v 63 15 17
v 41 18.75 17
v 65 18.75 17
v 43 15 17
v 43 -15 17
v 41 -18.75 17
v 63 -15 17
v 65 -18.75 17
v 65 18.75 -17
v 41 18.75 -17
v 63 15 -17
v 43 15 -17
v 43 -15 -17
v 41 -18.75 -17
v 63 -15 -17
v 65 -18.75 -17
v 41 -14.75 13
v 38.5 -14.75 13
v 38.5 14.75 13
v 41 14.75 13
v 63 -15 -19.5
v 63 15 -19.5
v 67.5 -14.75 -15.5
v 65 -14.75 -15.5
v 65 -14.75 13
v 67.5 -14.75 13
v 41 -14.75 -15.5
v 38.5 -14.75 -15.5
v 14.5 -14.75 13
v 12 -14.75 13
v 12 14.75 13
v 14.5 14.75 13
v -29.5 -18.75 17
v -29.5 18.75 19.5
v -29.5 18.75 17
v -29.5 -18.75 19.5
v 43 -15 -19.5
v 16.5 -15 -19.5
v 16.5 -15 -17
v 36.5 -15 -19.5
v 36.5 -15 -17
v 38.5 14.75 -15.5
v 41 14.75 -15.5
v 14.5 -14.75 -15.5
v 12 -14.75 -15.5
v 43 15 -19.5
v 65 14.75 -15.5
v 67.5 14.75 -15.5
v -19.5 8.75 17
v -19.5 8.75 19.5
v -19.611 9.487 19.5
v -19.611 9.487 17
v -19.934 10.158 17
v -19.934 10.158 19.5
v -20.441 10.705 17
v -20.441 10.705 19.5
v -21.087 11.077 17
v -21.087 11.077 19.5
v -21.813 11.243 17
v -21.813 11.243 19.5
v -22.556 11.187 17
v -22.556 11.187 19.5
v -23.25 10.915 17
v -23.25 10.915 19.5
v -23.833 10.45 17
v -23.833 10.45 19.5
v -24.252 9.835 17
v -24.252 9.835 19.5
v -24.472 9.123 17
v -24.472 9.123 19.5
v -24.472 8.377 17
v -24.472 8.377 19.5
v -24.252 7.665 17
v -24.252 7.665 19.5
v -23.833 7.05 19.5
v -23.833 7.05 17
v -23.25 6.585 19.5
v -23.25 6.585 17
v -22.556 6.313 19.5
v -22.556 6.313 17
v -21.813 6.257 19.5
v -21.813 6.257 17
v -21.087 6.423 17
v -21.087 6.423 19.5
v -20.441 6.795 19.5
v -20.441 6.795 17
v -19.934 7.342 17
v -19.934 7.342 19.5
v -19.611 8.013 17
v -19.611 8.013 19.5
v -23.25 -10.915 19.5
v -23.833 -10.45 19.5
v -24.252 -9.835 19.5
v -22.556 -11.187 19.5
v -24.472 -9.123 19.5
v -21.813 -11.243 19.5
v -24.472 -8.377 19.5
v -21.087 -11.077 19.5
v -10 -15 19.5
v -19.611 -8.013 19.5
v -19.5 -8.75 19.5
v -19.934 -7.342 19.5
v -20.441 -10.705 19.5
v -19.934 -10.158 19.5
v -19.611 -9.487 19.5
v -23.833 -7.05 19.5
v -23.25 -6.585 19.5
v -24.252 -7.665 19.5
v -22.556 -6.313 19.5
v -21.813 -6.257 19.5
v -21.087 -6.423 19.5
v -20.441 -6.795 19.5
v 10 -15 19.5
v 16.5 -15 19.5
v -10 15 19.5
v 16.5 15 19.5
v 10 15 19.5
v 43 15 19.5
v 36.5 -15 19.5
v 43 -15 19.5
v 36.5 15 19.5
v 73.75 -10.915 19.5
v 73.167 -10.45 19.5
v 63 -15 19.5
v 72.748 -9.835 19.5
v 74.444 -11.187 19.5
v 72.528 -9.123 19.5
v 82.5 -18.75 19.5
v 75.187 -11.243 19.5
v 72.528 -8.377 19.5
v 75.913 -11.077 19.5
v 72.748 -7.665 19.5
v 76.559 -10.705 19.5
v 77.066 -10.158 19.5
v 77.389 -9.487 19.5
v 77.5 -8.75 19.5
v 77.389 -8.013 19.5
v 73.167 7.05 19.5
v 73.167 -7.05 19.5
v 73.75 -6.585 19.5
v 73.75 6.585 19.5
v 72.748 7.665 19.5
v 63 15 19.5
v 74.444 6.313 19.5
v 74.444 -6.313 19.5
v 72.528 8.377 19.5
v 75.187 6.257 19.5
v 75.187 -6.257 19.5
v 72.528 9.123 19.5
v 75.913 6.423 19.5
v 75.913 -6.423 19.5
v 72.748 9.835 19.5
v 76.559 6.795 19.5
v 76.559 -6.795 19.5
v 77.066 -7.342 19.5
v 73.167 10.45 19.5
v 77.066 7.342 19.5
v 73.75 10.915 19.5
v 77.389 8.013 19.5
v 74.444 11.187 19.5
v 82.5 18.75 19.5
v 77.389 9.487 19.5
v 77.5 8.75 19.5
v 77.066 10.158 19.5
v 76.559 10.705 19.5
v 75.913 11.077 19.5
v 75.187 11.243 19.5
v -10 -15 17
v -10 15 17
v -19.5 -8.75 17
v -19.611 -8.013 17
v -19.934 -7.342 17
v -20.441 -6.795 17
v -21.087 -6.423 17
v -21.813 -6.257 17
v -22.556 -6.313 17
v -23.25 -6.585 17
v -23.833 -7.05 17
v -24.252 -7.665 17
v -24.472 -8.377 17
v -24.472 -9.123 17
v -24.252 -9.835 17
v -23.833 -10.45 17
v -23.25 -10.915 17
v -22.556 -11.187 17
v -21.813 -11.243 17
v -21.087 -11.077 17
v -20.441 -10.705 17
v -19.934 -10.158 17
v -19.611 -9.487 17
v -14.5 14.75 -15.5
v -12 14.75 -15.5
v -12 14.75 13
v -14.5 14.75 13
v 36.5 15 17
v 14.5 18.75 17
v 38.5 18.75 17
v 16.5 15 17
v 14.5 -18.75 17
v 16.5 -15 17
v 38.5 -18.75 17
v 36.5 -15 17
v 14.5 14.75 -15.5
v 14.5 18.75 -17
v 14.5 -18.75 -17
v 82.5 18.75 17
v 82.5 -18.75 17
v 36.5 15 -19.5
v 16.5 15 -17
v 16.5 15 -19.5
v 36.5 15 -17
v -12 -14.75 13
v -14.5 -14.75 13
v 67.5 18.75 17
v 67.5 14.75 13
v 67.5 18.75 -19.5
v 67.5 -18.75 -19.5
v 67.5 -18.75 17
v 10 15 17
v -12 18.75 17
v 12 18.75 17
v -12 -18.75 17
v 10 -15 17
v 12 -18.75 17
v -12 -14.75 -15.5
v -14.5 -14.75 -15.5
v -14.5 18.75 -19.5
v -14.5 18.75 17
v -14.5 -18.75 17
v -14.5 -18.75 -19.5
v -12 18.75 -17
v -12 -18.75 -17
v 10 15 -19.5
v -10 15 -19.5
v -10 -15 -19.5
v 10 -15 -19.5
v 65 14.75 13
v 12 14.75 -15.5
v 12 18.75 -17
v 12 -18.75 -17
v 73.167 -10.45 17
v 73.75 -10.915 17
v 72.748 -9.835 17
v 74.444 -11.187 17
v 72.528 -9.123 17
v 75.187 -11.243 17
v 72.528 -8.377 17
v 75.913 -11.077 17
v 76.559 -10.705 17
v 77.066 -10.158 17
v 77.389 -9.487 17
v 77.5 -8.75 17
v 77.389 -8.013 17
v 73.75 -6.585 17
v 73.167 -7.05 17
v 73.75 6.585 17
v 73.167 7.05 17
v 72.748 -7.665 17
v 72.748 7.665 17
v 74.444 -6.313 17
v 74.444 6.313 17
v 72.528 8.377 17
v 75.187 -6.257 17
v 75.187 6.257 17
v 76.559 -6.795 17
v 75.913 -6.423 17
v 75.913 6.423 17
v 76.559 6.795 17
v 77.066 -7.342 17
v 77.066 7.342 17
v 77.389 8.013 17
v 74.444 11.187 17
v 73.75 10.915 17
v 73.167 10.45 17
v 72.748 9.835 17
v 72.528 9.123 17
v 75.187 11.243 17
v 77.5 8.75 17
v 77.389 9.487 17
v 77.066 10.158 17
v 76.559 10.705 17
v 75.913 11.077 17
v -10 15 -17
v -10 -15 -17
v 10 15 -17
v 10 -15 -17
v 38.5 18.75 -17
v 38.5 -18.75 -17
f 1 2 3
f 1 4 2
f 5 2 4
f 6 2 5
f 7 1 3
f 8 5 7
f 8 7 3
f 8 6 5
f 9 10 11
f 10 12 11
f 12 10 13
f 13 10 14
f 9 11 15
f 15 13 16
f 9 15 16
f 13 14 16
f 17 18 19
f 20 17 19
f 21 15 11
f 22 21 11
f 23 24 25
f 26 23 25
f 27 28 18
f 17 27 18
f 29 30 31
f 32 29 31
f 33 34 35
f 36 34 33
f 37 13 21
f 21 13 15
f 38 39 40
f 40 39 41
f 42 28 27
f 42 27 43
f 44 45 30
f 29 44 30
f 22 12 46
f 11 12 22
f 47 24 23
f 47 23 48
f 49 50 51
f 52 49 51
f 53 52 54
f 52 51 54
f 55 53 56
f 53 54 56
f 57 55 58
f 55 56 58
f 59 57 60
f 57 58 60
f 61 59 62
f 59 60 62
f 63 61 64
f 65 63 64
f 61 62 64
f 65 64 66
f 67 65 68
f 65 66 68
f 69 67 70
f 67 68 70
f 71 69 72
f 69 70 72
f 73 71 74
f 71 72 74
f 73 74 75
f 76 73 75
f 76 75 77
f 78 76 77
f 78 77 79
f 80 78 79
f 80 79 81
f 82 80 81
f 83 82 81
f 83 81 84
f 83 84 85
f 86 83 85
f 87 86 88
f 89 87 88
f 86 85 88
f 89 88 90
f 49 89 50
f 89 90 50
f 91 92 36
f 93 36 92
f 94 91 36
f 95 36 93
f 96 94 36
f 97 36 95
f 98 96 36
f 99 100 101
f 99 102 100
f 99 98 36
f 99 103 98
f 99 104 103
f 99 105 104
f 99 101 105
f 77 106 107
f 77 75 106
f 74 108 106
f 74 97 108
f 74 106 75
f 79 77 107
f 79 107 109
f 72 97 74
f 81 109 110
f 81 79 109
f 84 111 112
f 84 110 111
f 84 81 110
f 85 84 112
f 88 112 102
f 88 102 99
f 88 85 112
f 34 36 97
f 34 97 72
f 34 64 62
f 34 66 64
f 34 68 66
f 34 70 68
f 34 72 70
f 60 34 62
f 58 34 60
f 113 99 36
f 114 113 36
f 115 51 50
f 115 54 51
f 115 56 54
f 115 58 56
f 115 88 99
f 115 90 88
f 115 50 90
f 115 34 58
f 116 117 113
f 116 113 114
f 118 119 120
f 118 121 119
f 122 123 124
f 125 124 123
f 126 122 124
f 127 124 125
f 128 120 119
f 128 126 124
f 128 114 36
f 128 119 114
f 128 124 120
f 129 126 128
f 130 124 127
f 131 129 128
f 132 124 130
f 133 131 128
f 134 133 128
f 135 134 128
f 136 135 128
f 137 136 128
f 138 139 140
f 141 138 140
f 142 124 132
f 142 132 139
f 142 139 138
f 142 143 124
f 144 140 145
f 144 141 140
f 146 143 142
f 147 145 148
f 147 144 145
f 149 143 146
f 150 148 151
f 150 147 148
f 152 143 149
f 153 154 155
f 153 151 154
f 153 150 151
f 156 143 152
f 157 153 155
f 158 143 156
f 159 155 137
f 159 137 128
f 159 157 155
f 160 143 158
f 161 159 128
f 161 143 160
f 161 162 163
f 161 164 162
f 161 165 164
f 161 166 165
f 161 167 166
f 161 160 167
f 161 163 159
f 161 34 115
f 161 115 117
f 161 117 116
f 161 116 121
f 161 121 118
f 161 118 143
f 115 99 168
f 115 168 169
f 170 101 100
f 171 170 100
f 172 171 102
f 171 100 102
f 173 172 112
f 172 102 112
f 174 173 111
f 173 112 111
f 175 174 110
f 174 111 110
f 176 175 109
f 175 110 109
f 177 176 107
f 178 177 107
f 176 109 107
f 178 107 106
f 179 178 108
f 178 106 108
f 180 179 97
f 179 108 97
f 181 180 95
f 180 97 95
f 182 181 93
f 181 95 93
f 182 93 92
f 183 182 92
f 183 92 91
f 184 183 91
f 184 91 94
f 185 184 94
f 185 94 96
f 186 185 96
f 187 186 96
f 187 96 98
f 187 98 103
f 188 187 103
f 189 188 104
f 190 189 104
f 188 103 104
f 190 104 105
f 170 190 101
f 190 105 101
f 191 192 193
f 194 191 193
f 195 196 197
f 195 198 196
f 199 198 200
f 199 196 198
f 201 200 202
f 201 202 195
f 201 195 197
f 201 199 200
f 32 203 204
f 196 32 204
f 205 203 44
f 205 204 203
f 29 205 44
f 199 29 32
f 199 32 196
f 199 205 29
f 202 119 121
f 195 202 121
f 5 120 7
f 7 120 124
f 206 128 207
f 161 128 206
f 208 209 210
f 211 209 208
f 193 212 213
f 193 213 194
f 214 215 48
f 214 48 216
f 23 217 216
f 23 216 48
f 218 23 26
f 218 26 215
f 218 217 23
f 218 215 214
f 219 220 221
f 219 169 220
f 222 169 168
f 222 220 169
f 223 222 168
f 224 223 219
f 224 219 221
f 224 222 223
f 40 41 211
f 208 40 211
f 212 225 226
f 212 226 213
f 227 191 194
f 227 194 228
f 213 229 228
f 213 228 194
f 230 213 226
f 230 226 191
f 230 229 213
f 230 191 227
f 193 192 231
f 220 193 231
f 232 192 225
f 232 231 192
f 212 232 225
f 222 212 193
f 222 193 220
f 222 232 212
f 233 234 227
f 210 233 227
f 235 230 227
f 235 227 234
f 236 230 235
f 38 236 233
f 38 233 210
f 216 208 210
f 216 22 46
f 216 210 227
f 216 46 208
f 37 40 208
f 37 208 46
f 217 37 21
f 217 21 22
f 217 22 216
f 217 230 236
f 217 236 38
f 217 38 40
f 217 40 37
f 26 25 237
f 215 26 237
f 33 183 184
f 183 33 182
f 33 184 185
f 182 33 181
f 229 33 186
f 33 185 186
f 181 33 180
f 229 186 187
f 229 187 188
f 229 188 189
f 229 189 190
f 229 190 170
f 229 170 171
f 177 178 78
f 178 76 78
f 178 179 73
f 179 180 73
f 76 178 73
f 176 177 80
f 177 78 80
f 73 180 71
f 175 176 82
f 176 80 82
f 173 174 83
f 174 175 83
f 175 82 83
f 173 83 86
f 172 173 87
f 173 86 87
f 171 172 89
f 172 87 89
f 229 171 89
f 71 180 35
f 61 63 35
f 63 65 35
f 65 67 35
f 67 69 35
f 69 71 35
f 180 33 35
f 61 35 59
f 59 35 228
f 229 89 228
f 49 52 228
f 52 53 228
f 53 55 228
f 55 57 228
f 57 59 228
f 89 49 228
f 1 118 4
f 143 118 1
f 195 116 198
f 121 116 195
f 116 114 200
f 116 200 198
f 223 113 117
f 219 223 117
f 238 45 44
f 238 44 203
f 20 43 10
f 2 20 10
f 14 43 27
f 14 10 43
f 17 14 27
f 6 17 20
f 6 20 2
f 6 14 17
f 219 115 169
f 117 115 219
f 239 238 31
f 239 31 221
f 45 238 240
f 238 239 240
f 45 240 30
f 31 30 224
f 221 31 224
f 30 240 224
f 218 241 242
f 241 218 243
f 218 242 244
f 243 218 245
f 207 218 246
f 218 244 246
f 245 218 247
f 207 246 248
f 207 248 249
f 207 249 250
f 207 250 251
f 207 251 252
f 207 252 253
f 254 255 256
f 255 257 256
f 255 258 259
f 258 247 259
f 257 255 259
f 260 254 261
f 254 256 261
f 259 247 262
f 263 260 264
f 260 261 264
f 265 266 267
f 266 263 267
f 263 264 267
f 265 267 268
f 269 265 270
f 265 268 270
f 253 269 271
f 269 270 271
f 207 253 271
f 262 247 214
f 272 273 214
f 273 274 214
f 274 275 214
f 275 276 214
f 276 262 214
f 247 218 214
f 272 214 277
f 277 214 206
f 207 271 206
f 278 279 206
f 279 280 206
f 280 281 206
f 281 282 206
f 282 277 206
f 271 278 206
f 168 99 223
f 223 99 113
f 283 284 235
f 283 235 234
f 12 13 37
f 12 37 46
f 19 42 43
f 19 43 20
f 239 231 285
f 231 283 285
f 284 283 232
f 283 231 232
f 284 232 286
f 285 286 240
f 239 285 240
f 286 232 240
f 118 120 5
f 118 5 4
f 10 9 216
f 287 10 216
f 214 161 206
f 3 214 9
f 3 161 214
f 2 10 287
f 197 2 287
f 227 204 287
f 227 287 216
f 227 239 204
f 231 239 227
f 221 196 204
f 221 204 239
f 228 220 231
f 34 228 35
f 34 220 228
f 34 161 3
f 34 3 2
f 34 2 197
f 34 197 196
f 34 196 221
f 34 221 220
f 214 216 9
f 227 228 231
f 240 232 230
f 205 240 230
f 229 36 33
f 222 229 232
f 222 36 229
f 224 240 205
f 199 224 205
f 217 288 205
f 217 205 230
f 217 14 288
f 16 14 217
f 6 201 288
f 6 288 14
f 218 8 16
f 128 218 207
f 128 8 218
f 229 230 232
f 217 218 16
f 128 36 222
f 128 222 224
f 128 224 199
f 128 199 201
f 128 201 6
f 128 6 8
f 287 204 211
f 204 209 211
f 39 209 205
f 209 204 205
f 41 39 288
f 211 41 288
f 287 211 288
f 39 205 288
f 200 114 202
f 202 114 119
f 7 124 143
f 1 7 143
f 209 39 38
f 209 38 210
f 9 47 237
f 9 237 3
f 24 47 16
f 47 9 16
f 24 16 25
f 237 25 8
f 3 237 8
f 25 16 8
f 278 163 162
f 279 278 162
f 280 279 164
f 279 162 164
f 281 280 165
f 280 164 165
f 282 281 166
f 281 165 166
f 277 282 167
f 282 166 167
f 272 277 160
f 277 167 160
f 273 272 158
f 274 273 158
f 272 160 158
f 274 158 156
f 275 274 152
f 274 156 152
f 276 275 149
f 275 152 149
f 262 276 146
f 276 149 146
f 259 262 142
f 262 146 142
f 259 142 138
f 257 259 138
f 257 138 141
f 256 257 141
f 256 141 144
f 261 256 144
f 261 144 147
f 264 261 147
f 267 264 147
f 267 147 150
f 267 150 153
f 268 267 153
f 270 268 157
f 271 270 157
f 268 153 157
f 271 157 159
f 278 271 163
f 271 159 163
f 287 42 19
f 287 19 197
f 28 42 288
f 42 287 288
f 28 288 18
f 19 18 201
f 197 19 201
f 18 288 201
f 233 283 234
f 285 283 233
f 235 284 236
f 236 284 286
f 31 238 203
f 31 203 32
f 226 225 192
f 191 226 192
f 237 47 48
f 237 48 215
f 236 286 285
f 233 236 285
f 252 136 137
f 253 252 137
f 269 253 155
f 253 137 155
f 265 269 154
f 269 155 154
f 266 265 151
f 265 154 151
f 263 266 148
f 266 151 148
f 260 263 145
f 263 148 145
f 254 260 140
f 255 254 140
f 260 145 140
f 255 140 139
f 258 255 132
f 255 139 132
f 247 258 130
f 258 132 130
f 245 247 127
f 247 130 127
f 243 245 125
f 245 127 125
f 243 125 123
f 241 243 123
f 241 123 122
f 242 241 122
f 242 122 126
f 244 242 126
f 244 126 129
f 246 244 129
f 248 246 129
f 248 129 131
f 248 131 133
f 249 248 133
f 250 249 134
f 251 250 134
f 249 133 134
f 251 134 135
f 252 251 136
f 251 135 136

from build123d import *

# Parameters (mm, degrees)
F0_W          = 24
F0_H          = 34
F1_DEPTH      = 18.75
F1_DEPTH_BACK = 18.75
F2_R          = 2.5
F2_W          = 20
F2_H          = 30
F3_DEPTH      = 2.5
F4_DEPTH      = 60
F5_W          = 29.5
F5_H          = 28.5
F6_DEPTH      = 76.15809
F6_DEPTH_BACK = 25


with BuildPart() as f1:
    # F0 (on Front) → F1 (new body, two sides)
    with BuildSketch(Plane.XZ) as f1_sk:
        Polygon((14.5, 19.5), (-14.5, 19.5), (-14.5, -19.5), (14.5, -19.5), (43.5, -19.5), (67.5, -19.5), (67.5, 19.5), (43.5, 19.5), align=None)
        Rectangle(F0_W, F0_H, mode=Mode.SUBTRACT)
        with Locations((26.5, 0)):
            Rectangle(F0_W, F0_H, mode=Mode.SUBTRACT)
        with Locations((53, 0)):
            Rectangle(F0_W, F0_H, mode=Mode.SUBTRACT)
    extrude(amount=F1_DEPTH)
    extrude(f1_sk.sketch, amount=-F1_DEPTH_BACK)

    # F2 (on face) → F3 (join)
    with BuildSketch(Plane.XY.offset(19.5)):
        Polygon((-29.5, 18.75), (-29.5, -18.75), (82.5, -18.75), (82.5, 18.75), (-14.5, 18.75), align=None)
        with Locations((-22, -8.75)):
            Circle(F2_R, mode=Mode.SUBTRACT)
        with Locations((75, -8.75)):
            Circle(F2_R, mode=Mode.SUBTRACT)
        with Locations((-22, 8.75)):
            Circle(F2_R, mode=Mode.SUBTRACT)
        Rectangle(F2_W, F2_H, mode=Mode.SUBTRACT)
        with Locations((26.5, 0)):
            Rectangle(F2_W, F2_H, mode=Mode.SUBTRACT)
        with Locations((53, 0)):
            Rectangle(F2_W, F2_H, mode=Mode.SUBTRACT)
        with Locations((75, 8.75)):
            Circle(F2_R, mode=Mode.SUBTRACT)
    extrude(amount=-F3_DEPTH)

    # F2 (on face) → F4 (cut)
    with BuildSketch(Plane.XY.offset(19.5)):
        Rectangle(F2_W, F2_H)
        with Locations((53, 0)):
            Rectangle(F2_W, F2_H)
        with Locations((26.5, 0)):
            Rectangle(F2_W, F2_H)
    extrude(amount=-F4_DEPTH, mode=Mode.SUBTRACT)

    # F5 (on Right) → F6 (cut, two sides)
    with BuildSketch(Plane.YZ) as f6_sk:
        with Locations((0, -1.25)):
            Rectangle(F5_W, F5_H)
    extrude(amount=F6_DEPTH, mode=Mode.SUBTRACT)
    extrude(f6_sk.sketch, amount=-F6_DEPTH_BACK, mode=Mode.SUBTRACT)


solid = f1.part
